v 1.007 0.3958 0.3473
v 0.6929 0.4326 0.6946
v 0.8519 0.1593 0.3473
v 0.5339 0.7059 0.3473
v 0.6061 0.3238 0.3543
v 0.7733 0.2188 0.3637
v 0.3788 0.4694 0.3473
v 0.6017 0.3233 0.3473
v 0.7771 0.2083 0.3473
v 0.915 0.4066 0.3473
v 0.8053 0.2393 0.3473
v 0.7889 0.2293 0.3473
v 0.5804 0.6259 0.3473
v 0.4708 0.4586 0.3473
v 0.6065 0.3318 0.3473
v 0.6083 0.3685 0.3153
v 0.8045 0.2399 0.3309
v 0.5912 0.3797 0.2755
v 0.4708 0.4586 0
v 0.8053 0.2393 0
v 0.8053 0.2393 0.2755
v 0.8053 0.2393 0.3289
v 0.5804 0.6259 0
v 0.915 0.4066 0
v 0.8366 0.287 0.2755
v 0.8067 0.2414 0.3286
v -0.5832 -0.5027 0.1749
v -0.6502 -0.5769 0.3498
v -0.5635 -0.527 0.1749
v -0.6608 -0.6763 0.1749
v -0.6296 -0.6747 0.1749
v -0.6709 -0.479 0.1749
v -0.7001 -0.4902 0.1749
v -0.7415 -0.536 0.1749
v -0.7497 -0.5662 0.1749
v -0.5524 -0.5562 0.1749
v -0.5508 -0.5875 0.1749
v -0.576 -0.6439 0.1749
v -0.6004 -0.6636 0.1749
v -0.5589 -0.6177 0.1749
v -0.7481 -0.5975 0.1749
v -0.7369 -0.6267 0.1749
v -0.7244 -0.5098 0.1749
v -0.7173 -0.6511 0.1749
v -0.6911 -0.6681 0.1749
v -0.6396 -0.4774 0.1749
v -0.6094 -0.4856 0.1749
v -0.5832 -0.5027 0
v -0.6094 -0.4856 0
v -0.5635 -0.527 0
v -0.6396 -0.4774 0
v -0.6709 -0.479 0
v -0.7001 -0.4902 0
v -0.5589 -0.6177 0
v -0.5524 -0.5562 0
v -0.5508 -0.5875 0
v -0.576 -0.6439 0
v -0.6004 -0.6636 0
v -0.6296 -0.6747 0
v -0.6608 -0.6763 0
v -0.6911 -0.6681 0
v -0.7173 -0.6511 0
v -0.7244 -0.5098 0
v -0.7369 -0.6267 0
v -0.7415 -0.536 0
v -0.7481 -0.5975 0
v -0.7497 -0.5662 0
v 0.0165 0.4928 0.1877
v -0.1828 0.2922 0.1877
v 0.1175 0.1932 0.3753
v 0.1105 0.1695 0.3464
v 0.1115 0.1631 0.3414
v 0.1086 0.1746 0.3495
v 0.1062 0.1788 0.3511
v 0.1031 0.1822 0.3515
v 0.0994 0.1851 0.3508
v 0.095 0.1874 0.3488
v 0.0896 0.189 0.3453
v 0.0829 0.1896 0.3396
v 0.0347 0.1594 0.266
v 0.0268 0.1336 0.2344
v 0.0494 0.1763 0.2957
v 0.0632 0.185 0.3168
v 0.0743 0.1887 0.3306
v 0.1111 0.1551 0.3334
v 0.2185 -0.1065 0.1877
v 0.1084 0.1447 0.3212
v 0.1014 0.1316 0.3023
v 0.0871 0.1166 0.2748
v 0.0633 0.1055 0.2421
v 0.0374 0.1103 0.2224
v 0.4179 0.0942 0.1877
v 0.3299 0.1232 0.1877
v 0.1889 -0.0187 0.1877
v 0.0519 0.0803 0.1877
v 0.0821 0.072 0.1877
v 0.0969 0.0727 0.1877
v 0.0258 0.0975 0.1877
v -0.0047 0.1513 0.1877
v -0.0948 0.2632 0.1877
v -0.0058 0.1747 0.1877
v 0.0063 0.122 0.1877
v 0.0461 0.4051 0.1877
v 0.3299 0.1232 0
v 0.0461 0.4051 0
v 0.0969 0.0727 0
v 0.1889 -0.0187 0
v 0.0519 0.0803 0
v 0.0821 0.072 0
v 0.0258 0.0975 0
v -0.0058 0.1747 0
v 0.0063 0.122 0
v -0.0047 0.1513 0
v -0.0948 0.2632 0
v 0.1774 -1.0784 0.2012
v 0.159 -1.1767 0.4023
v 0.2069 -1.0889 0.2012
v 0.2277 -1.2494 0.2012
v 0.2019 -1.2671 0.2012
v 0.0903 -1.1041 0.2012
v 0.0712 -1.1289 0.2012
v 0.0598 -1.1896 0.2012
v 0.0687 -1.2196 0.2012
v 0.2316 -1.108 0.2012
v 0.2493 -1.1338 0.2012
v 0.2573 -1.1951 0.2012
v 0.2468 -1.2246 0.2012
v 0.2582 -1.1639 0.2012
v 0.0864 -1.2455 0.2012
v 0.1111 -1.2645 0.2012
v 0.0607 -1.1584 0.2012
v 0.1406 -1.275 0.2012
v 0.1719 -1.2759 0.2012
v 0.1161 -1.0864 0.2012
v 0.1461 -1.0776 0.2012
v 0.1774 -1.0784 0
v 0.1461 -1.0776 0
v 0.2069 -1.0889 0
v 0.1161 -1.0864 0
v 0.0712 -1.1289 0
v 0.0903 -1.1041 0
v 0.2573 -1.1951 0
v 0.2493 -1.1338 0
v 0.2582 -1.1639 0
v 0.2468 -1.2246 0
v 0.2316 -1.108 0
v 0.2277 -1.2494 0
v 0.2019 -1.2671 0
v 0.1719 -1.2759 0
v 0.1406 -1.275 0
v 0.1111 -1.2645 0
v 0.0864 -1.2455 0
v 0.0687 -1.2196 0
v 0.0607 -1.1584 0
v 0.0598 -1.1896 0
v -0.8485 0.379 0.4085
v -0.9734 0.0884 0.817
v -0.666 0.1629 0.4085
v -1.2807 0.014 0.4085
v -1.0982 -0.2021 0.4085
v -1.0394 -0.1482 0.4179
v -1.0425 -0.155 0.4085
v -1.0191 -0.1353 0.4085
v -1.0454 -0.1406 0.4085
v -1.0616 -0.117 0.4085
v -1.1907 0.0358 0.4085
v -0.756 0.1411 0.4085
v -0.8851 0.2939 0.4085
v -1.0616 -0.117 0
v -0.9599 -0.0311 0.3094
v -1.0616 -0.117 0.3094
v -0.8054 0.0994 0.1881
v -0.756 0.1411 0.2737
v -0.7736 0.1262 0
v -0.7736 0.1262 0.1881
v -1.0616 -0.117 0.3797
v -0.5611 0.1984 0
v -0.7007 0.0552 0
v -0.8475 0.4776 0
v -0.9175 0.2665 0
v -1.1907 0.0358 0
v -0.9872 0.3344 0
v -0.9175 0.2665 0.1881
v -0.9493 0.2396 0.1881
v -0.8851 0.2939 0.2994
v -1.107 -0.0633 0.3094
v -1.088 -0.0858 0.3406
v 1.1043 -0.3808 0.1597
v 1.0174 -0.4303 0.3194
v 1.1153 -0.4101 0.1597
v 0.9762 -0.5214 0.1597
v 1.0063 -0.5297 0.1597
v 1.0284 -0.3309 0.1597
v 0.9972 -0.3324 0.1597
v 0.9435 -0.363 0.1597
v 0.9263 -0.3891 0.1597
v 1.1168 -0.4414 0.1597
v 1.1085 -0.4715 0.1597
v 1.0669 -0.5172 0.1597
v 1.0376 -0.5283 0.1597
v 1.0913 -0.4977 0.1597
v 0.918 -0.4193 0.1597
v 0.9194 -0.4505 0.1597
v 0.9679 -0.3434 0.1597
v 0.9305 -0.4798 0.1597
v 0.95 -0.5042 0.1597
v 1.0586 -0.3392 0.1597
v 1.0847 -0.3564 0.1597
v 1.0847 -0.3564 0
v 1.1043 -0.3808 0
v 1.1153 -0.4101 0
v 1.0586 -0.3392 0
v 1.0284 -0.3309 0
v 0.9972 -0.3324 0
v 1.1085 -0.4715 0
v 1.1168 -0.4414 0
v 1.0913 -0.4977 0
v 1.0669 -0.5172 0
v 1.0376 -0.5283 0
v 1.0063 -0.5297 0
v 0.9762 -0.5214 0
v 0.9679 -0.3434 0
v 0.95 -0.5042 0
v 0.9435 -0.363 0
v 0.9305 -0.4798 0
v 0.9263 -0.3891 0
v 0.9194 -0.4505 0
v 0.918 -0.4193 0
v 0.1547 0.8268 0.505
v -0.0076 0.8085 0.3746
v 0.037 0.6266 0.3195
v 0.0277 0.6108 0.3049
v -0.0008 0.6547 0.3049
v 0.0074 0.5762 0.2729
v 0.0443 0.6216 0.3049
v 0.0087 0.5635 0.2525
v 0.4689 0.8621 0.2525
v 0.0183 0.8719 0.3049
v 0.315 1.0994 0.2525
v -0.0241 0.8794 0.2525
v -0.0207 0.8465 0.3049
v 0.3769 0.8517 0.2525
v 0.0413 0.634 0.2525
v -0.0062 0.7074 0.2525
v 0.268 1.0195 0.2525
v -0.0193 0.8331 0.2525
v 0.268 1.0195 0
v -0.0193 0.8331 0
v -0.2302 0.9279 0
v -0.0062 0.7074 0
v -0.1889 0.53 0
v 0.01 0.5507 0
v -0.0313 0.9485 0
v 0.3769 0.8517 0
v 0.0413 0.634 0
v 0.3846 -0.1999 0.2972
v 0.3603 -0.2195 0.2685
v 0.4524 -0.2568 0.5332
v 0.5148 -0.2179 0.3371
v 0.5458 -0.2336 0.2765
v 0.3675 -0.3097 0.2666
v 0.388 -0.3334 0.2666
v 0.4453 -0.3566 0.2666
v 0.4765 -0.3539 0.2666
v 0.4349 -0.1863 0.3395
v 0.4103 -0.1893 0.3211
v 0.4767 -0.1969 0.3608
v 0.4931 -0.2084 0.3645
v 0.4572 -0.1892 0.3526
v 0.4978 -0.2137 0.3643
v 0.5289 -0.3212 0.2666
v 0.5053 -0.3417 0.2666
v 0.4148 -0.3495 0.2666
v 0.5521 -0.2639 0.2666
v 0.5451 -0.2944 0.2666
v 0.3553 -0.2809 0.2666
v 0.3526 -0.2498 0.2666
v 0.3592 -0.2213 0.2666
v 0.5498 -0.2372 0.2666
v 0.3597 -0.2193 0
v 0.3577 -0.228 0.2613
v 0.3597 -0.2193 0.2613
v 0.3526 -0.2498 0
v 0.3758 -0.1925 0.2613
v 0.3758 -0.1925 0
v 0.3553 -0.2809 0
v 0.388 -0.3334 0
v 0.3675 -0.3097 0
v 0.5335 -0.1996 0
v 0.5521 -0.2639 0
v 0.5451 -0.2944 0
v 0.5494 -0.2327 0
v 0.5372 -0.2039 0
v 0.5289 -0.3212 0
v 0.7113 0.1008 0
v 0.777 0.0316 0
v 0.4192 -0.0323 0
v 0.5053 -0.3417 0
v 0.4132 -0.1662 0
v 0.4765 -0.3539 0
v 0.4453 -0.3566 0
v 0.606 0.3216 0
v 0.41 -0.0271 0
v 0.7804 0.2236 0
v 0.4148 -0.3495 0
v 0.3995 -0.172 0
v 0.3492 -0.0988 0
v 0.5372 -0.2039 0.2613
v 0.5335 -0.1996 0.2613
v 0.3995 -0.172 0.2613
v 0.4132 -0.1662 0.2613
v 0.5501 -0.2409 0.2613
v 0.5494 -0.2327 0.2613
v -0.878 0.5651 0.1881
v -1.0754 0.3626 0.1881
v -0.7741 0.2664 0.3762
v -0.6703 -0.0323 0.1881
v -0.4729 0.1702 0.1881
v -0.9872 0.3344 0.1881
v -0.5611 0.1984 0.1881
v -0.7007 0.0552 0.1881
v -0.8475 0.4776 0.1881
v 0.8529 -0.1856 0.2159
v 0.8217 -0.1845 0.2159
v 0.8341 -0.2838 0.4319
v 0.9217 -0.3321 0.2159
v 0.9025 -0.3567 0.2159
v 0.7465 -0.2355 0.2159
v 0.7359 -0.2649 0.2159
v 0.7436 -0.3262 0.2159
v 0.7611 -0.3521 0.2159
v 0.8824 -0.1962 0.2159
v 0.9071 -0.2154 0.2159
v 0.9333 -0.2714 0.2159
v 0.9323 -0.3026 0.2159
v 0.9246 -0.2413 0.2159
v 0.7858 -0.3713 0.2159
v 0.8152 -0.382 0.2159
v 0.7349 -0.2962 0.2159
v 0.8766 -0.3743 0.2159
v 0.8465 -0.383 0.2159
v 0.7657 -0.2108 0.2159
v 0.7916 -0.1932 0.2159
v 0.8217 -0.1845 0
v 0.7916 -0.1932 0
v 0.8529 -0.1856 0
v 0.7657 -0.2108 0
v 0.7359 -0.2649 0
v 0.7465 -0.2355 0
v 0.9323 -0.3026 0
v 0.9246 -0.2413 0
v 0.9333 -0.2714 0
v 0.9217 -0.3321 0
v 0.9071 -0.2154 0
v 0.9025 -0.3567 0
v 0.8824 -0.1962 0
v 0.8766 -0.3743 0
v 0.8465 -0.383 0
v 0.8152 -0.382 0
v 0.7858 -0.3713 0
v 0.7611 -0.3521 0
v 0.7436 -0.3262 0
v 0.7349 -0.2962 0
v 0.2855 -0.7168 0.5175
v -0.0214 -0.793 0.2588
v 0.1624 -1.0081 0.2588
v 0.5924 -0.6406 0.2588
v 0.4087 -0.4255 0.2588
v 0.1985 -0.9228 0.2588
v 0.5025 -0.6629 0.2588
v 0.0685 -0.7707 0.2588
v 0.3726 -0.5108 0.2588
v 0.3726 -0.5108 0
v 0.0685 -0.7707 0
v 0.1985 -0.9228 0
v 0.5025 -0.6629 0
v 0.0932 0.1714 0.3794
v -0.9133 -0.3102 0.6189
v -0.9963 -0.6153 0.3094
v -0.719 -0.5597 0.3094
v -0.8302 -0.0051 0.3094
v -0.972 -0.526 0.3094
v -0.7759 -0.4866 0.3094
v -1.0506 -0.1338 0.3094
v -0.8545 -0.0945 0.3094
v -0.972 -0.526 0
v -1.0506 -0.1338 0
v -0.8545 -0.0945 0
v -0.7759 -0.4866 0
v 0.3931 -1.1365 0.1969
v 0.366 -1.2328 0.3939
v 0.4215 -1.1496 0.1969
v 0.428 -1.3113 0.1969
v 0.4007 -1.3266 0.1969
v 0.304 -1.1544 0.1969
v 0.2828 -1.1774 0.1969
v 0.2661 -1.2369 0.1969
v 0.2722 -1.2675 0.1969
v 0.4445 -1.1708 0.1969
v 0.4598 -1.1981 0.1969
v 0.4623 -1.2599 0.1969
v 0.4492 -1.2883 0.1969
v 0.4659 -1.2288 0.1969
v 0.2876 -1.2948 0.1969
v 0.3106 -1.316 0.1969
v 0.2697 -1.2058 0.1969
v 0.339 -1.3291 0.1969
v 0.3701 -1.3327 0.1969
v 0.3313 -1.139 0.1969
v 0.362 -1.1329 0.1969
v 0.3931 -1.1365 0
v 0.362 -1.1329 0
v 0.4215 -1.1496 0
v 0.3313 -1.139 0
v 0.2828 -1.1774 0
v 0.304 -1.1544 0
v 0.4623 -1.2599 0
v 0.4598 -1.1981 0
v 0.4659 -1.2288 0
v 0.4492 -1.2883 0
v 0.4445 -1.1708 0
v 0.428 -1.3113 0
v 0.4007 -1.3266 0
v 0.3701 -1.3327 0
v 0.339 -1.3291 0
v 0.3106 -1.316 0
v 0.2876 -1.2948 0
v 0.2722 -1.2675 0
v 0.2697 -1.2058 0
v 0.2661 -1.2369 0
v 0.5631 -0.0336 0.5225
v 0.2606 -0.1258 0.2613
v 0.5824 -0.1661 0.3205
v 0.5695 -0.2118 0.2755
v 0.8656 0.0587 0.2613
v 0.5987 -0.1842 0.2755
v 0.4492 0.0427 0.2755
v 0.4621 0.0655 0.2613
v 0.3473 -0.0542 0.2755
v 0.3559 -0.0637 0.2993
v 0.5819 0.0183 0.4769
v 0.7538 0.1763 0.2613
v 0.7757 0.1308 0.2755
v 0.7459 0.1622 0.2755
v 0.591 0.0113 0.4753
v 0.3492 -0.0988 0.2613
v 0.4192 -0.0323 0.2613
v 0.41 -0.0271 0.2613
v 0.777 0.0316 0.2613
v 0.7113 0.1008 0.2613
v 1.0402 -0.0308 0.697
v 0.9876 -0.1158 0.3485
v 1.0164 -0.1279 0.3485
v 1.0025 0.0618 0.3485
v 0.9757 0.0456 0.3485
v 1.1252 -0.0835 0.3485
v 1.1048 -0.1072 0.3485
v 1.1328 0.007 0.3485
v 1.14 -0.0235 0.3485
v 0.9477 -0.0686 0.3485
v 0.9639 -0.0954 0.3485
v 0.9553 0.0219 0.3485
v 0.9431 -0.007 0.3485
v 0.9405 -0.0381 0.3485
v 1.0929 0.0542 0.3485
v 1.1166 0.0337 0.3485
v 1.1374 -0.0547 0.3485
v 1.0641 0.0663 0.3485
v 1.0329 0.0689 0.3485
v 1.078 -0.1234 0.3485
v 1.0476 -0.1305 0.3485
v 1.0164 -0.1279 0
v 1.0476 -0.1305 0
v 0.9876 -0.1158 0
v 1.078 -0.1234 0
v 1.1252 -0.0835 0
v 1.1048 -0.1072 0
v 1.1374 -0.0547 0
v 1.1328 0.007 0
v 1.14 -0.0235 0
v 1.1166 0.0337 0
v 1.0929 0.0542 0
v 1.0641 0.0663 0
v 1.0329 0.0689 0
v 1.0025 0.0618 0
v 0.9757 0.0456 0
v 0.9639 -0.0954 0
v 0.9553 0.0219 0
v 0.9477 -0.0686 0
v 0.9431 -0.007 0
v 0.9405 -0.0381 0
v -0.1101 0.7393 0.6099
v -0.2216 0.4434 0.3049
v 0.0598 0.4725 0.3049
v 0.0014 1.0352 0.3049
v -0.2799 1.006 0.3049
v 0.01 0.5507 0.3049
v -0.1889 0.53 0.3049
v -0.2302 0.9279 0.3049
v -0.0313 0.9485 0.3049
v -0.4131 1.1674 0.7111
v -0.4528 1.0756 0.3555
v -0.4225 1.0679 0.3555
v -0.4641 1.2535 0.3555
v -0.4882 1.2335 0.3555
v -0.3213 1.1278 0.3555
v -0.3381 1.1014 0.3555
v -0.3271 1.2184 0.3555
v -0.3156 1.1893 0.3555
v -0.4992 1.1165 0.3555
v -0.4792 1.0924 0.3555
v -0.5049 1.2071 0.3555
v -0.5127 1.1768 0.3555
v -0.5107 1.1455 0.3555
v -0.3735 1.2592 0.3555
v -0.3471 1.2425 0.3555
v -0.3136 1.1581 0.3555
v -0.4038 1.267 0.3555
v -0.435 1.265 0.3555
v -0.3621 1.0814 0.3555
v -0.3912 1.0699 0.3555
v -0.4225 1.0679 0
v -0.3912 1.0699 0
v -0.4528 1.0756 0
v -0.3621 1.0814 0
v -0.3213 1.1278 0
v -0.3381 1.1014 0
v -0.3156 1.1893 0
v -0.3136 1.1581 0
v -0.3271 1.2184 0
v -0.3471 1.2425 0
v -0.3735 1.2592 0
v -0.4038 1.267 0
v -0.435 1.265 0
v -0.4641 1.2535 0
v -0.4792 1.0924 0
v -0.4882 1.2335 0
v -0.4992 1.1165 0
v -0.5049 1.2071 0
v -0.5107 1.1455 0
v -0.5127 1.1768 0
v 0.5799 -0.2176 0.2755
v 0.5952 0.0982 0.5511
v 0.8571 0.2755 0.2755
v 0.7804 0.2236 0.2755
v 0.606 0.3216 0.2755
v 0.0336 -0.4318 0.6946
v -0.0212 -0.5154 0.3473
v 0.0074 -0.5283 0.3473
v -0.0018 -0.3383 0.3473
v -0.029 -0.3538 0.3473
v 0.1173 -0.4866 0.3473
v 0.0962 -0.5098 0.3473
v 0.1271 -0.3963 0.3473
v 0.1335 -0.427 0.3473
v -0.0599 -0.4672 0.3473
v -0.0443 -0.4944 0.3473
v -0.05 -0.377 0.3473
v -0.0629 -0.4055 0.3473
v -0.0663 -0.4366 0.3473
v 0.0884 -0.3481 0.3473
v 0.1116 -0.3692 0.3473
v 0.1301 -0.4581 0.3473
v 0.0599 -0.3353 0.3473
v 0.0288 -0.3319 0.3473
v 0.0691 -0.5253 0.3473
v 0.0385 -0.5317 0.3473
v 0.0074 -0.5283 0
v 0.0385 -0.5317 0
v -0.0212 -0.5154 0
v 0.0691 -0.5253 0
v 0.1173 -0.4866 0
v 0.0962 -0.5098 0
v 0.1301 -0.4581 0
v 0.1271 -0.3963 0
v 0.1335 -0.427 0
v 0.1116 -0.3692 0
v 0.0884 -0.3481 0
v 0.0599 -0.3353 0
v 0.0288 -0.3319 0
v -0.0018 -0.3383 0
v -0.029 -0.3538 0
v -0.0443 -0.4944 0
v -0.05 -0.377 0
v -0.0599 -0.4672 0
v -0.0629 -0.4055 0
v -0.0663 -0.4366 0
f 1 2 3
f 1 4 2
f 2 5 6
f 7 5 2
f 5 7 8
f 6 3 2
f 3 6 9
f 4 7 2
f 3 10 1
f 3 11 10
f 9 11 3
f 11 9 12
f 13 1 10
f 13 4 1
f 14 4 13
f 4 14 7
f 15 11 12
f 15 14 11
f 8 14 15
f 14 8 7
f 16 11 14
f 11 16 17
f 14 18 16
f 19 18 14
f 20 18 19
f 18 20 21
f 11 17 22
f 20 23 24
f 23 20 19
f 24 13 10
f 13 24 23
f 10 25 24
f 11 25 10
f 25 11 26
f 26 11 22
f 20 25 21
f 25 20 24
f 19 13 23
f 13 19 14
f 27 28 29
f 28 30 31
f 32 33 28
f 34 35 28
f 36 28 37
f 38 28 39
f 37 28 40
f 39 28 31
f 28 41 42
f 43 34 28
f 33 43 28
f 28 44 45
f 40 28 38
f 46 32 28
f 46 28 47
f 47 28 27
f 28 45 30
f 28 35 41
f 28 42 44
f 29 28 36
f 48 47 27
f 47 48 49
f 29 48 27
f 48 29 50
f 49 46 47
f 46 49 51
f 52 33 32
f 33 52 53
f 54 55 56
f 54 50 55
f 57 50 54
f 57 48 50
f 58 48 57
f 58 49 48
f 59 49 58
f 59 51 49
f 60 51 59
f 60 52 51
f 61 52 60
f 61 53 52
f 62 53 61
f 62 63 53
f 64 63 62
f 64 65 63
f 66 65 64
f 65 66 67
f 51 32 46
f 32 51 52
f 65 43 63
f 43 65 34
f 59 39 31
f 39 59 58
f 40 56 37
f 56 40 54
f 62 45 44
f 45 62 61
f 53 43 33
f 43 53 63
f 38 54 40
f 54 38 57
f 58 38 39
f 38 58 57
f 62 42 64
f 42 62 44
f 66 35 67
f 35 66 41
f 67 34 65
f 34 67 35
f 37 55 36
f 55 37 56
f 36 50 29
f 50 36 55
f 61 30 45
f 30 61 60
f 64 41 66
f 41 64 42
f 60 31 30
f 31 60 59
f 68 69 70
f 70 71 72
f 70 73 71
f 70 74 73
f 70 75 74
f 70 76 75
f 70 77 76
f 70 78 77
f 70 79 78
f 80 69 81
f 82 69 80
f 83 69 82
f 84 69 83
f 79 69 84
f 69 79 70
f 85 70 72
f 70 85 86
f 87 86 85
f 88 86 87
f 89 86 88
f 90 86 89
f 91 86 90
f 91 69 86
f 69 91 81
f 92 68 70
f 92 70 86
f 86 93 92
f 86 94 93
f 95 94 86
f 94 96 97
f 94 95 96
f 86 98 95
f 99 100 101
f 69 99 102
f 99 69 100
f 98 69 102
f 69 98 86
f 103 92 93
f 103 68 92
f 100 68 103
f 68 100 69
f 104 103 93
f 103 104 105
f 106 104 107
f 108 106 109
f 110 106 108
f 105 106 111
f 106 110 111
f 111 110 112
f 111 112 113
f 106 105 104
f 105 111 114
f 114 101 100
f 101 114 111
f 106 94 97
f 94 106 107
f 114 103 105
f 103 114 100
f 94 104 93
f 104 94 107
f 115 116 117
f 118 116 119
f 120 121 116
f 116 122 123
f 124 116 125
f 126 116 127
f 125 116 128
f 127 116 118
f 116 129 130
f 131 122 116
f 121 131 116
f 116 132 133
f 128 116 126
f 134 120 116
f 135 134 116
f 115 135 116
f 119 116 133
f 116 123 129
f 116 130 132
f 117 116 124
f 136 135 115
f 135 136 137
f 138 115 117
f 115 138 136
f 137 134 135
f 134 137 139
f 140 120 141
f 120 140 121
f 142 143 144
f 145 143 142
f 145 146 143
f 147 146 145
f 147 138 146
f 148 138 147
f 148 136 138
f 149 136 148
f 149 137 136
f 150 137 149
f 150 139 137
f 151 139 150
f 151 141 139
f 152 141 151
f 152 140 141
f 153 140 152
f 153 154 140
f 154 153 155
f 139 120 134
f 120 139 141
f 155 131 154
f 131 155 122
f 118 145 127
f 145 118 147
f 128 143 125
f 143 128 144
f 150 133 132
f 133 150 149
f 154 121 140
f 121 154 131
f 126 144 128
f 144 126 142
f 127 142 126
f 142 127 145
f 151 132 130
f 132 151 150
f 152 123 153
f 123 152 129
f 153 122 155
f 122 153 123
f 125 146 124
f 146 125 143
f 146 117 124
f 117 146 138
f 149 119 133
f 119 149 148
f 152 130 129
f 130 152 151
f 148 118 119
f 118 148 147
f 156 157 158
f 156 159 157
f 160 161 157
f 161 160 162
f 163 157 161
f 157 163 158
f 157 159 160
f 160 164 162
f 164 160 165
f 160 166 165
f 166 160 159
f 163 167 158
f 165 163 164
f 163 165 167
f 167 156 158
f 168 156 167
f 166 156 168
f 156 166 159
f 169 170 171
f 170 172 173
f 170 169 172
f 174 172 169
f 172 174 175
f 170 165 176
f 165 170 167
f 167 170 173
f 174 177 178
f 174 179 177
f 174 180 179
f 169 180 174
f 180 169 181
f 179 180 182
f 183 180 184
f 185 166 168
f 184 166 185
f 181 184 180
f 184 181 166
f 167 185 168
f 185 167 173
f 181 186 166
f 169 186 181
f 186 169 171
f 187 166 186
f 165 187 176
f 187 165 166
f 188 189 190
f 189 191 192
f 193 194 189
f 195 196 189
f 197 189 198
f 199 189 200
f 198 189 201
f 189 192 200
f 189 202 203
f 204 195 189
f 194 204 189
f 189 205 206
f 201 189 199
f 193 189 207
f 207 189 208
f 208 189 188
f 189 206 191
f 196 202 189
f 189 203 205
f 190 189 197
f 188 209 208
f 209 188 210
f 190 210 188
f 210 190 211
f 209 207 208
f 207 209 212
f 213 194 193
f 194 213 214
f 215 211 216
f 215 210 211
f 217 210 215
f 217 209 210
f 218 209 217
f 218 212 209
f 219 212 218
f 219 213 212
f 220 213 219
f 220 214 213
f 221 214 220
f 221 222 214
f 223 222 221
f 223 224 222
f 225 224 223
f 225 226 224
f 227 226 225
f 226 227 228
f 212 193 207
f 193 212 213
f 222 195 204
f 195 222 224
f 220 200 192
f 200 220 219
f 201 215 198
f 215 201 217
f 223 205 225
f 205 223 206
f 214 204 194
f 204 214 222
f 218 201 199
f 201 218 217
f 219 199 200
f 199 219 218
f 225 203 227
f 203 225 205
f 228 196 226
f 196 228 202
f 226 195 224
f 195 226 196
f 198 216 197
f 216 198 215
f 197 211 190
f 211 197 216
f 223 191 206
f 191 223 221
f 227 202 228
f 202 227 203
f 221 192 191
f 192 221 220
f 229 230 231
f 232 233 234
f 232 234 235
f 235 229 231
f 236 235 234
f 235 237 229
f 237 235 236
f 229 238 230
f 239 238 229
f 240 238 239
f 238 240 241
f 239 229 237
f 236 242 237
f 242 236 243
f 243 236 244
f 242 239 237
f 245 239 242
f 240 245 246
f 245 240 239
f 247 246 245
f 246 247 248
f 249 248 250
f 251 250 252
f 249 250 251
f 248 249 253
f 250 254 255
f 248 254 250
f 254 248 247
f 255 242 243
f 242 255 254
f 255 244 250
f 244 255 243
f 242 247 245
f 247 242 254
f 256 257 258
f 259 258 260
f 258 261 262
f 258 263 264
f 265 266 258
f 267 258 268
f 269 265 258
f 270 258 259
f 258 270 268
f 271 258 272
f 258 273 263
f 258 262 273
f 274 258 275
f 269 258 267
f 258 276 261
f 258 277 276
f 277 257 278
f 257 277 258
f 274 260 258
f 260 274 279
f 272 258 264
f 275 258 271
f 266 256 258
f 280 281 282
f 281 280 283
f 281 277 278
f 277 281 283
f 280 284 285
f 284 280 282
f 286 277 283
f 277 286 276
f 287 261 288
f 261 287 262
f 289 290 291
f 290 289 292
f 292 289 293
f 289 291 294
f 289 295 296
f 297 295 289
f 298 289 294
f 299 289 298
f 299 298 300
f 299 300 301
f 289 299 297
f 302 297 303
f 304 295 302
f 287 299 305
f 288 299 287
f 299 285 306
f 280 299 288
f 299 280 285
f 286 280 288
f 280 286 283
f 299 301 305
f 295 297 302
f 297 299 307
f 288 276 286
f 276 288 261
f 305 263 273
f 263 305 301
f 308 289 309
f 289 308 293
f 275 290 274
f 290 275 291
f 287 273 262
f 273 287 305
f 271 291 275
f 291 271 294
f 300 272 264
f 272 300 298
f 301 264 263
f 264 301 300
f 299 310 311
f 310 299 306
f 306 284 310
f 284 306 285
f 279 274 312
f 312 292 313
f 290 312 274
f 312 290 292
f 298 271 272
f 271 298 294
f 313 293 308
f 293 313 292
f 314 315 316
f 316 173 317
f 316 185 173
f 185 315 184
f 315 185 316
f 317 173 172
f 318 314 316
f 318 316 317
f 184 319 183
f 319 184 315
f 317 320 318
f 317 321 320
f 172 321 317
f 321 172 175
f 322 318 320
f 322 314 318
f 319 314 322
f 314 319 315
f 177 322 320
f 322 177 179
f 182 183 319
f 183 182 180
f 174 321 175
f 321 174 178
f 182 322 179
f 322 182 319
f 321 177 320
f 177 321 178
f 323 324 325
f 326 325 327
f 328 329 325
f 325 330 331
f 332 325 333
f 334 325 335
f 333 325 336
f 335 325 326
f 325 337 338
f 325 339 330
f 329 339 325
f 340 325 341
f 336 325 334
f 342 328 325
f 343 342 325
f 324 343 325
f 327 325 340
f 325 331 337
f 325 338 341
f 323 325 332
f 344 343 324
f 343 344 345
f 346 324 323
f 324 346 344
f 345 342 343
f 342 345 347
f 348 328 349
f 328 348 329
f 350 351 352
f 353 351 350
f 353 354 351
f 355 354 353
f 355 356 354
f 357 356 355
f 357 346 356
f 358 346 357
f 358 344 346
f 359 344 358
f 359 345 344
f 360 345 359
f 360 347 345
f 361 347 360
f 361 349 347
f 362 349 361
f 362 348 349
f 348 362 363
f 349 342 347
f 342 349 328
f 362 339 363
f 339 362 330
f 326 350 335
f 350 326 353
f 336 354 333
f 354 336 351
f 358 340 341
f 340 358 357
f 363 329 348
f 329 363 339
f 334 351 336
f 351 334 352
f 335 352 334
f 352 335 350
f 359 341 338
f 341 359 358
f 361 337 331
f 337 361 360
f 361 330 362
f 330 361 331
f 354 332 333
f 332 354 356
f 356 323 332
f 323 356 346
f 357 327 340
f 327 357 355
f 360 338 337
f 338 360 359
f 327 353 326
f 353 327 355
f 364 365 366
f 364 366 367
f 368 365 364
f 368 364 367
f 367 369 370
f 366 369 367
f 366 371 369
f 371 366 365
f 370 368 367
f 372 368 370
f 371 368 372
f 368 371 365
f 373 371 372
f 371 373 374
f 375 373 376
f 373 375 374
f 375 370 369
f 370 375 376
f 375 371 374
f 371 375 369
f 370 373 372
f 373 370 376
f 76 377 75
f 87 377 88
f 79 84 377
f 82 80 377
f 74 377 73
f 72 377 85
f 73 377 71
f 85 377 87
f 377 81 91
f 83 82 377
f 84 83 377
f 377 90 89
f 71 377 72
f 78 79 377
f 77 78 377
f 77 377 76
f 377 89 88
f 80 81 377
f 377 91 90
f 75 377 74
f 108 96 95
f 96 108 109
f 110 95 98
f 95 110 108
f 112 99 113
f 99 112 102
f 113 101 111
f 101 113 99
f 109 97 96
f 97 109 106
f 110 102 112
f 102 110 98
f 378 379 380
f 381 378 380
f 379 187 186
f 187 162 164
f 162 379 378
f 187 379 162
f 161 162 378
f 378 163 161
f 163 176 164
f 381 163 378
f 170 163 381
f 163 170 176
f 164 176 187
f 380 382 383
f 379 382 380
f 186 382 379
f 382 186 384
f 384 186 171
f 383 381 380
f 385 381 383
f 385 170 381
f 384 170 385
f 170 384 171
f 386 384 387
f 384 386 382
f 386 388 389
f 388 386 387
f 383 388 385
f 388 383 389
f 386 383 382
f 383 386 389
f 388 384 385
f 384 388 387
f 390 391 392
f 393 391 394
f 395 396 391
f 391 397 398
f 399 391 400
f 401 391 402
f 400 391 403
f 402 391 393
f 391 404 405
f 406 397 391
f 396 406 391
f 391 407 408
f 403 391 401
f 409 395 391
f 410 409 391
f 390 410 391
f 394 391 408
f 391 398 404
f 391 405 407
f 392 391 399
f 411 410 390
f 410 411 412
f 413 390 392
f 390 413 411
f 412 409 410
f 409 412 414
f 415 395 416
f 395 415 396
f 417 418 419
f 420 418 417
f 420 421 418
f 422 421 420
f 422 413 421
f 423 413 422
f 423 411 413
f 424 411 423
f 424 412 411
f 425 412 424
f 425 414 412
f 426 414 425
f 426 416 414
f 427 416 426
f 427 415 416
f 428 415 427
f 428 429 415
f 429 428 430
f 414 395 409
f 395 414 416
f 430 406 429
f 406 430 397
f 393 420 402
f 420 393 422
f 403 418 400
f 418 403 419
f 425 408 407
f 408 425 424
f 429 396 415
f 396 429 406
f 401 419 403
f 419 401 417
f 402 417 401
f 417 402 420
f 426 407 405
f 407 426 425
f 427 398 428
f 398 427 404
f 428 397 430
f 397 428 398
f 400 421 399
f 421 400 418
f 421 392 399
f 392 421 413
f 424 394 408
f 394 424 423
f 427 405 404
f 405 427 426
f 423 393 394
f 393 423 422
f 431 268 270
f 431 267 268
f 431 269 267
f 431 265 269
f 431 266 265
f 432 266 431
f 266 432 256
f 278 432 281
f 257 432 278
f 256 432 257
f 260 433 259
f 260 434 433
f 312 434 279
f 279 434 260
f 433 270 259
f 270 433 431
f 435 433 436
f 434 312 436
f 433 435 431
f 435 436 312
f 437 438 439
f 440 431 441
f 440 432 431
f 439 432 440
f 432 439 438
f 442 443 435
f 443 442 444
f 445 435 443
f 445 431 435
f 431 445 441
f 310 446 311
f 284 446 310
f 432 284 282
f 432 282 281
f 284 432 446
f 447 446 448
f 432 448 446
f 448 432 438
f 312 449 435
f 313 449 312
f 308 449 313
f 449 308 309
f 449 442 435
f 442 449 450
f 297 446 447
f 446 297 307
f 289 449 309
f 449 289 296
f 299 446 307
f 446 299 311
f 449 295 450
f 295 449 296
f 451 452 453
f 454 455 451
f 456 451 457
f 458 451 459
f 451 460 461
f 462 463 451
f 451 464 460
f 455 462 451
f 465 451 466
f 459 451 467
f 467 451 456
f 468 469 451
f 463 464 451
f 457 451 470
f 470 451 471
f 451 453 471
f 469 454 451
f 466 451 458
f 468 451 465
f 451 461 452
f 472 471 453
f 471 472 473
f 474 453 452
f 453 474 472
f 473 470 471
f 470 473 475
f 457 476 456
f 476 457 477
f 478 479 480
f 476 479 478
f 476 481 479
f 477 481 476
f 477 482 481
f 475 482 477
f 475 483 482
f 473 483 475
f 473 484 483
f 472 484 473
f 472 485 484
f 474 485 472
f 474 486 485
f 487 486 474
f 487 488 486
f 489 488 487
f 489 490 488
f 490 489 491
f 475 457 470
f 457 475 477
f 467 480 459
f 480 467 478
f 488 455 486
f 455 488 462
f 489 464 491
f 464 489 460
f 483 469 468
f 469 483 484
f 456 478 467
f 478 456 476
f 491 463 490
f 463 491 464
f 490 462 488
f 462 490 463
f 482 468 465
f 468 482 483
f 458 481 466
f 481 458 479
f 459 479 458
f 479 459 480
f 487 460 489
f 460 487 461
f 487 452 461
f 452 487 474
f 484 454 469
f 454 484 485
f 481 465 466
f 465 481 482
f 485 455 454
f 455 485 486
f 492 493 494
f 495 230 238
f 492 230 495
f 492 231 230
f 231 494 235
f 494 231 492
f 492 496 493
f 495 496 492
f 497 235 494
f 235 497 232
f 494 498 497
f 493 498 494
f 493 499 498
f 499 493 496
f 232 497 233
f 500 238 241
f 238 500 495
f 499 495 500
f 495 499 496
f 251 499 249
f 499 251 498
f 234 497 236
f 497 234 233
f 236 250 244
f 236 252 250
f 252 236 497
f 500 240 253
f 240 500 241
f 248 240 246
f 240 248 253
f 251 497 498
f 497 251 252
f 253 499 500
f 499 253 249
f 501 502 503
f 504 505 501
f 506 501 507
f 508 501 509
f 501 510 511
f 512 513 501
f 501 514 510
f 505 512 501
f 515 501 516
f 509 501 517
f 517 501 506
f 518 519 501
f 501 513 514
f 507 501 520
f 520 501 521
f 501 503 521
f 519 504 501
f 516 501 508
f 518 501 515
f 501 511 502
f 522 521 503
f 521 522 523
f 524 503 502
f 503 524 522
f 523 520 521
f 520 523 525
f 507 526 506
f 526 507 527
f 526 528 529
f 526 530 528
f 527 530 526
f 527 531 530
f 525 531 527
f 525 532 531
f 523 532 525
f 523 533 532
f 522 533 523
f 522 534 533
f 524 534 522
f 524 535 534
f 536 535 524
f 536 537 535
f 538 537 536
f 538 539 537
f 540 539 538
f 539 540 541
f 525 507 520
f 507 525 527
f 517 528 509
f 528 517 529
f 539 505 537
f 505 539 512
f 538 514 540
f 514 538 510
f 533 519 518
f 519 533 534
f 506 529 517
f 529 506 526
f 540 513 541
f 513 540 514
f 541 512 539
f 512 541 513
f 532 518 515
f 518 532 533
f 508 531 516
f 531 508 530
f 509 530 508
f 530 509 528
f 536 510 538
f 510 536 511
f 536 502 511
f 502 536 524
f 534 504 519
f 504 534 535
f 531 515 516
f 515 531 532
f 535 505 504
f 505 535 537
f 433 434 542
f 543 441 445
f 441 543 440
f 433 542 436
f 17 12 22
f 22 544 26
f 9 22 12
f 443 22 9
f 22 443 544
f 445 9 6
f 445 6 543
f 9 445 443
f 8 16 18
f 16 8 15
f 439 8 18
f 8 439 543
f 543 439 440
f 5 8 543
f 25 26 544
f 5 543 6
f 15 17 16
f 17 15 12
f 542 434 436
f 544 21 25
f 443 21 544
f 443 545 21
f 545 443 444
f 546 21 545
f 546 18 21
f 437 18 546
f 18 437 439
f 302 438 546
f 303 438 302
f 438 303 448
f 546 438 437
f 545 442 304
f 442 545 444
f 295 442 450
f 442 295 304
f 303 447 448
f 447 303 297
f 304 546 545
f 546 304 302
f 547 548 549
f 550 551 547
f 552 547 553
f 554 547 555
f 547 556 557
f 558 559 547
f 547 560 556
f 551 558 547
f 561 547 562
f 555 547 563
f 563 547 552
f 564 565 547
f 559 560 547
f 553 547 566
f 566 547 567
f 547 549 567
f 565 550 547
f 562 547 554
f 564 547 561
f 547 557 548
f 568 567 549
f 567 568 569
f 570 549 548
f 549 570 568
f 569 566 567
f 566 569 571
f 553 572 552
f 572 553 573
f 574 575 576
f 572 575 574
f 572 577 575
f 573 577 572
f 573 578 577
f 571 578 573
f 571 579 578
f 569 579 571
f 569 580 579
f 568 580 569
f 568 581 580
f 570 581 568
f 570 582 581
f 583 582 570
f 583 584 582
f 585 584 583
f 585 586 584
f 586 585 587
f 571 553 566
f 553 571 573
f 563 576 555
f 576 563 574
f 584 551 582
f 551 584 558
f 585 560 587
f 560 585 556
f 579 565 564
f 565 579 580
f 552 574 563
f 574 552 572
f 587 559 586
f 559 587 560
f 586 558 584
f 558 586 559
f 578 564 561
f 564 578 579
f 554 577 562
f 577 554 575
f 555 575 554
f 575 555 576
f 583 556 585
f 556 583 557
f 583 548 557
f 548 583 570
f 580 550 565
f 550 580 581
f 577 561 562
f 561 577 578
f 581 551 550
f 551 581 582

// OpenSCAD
$fn=20;
seed=50;

count=20;
place = [
         rands(-1,1,count,seed),
         rands(-1,1,count,seed+50),
         rands(0.5,1.5,count,seed + 20),
         rands(0,360,count,seed + 20),
         ];

scale([1,1,1.5])
for (i = [0:count-1]) {
  x = place[0][i];
  y = place[1][i];
  z = place[2][i];
  a = place[3][i];

  rotate(a)
    translate([x, y, 0])
    scale(0.2)
    scale([1,1,z]) {
    if (i % 2 == 0) {
      translate([0, 0, 1])
        scale([1, 2, 1])
        rotate(45)
        cylinder(1, 1, 0, $fn=4);
      
      translate([0, 0, 0.5])
        cube([1,2,1], center=true);
    } else {
      translate([0, 0, 1])
        cylinder(1,0.5,0);
    
      cylinder(1,0.5,0.5);
    }
  }
 }
